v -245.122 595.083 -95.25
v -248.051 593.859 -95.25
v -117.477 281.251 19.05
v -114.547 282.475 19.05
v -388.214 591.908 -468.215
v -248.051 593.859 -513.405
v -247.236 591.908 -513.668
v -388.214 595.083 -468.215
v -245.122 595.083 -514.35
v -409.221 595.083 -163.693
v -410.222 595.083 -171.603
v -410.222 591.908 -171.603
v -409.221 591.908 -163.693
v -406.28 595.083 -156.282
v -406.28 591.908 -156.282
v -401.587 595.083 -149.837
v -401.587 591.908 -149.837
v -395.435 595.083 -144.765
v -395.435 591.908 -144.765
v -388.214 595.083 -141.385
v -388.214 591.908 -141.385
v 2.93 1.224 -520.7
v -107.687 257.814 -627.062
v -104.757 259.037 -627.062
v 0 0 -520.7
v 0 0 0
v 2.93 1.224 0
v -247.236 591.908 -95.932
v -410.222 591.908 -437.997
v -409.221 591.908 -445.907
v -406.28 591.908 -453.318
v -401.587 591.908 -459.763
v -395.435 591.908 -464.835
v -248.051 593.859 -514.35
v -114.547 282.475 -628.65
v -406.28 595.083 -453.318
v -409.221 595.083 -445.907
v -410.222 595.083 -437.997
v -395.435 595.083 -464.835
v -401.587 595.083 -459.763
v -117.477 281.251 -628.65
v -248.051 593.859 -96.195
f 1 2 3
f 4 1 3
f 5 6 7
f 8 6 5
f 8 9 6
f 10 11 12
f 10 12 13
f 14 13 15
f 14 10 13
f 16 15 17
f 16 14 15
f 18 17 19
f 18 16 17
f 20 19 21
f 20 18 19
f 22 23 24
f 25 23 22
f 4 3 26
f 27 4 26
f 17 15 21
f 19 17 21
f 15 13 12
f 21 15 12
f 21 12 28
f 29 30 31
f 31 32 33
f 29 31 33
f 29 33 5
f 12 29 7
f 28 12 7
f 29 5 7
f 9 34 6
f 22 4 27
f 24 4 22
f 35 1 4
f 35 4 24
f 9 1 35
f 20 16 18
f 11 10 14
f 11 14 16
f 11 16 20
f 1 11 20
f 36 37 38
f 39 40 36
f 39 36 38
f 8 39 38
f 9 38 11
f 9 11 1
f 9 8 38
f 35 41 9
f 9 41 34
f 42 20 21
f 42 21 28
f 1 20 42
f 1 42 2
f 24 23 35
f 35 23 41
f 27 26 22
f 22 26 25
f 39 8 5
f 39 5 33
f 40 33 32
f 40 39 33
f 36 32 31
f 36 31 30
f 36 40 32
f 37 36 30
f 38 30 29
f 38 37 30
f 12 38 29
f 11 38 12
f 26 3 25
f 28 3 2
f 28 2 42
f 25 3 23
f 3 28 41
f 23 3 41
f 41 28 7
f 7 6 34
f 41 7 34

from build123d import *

# Parameters (mm, degrees)
BOSS_EXTRUDE2_DEPTH = 3.175
BOSS_EXTRUDE3_DEPTH = 3.175
CUT_EXTRUDE2_DEPTH  = 958.917567573


with BuildPart() as part:
    # Sketch3 → Boss-Extrude2 (new body)
    with BuildSketch(Plane(origin=(0, 0, 0), x_dir=(0, 0, -1), z_dir=(0.9227400229187457, 0.3854229496331436, 0))):
        Polygon((0, 0), (609.6, 0), (628.65, 304.8), (514.35, 643.582154794), (95.25, 643.582154794), (-19.05, 304.8), align=None)
    extrude(amount=BOSS_EXTRUDE2_DEPTH)

    # Sketch4 → Boss-Extrude3 (add)
    with BuildSketch(Plane(origin=(0, 595.08273013, 0), x_dir=(1, 0, 0), z_dir=(0, 1, 0))):
        with BuildLine():
            Line((-245.121632859, 514.35), (-388.214384584, 468.215025945))
            ThreePointArc((-388.214384584, 468.215025945), (-404.136734332, 456.688108103), (-410.221632859, 437.996798187))
            Line((-410.221632859, 437.996798187), (-410.221632859, 171.603201813))
            ThreePointArc((-410.221632859, 171.603201813), (-404.136734332, 152.911891897), (-388.214384584, 141.384974055))
            Line((-388.214384584, 141.384974055), (-245.121632859, 95.25))
            Line((-245.121632859, 95.25), (-245.121632859, 514.35))
        make_face()
    extrude(amount=-BOSS_EXTRUDE3_DEPTH)

    # Sketch5 → Cut-Extrude2 (cut, through all)
    with BuildSketch(Plane(origin=(0, 0, 0), x_dir=(0, 0, -1), z_dir=(0.9227400229187457, 0.3854229496331436, 0))):
        Polygon((609.6, 0), (627.0625, 279.4), (520.7, 0), align=None)
    extrude(amount=CUT_EXTRUDE2_DEPTH, mode=Mode.SUBTRACT)


solid = part.part
